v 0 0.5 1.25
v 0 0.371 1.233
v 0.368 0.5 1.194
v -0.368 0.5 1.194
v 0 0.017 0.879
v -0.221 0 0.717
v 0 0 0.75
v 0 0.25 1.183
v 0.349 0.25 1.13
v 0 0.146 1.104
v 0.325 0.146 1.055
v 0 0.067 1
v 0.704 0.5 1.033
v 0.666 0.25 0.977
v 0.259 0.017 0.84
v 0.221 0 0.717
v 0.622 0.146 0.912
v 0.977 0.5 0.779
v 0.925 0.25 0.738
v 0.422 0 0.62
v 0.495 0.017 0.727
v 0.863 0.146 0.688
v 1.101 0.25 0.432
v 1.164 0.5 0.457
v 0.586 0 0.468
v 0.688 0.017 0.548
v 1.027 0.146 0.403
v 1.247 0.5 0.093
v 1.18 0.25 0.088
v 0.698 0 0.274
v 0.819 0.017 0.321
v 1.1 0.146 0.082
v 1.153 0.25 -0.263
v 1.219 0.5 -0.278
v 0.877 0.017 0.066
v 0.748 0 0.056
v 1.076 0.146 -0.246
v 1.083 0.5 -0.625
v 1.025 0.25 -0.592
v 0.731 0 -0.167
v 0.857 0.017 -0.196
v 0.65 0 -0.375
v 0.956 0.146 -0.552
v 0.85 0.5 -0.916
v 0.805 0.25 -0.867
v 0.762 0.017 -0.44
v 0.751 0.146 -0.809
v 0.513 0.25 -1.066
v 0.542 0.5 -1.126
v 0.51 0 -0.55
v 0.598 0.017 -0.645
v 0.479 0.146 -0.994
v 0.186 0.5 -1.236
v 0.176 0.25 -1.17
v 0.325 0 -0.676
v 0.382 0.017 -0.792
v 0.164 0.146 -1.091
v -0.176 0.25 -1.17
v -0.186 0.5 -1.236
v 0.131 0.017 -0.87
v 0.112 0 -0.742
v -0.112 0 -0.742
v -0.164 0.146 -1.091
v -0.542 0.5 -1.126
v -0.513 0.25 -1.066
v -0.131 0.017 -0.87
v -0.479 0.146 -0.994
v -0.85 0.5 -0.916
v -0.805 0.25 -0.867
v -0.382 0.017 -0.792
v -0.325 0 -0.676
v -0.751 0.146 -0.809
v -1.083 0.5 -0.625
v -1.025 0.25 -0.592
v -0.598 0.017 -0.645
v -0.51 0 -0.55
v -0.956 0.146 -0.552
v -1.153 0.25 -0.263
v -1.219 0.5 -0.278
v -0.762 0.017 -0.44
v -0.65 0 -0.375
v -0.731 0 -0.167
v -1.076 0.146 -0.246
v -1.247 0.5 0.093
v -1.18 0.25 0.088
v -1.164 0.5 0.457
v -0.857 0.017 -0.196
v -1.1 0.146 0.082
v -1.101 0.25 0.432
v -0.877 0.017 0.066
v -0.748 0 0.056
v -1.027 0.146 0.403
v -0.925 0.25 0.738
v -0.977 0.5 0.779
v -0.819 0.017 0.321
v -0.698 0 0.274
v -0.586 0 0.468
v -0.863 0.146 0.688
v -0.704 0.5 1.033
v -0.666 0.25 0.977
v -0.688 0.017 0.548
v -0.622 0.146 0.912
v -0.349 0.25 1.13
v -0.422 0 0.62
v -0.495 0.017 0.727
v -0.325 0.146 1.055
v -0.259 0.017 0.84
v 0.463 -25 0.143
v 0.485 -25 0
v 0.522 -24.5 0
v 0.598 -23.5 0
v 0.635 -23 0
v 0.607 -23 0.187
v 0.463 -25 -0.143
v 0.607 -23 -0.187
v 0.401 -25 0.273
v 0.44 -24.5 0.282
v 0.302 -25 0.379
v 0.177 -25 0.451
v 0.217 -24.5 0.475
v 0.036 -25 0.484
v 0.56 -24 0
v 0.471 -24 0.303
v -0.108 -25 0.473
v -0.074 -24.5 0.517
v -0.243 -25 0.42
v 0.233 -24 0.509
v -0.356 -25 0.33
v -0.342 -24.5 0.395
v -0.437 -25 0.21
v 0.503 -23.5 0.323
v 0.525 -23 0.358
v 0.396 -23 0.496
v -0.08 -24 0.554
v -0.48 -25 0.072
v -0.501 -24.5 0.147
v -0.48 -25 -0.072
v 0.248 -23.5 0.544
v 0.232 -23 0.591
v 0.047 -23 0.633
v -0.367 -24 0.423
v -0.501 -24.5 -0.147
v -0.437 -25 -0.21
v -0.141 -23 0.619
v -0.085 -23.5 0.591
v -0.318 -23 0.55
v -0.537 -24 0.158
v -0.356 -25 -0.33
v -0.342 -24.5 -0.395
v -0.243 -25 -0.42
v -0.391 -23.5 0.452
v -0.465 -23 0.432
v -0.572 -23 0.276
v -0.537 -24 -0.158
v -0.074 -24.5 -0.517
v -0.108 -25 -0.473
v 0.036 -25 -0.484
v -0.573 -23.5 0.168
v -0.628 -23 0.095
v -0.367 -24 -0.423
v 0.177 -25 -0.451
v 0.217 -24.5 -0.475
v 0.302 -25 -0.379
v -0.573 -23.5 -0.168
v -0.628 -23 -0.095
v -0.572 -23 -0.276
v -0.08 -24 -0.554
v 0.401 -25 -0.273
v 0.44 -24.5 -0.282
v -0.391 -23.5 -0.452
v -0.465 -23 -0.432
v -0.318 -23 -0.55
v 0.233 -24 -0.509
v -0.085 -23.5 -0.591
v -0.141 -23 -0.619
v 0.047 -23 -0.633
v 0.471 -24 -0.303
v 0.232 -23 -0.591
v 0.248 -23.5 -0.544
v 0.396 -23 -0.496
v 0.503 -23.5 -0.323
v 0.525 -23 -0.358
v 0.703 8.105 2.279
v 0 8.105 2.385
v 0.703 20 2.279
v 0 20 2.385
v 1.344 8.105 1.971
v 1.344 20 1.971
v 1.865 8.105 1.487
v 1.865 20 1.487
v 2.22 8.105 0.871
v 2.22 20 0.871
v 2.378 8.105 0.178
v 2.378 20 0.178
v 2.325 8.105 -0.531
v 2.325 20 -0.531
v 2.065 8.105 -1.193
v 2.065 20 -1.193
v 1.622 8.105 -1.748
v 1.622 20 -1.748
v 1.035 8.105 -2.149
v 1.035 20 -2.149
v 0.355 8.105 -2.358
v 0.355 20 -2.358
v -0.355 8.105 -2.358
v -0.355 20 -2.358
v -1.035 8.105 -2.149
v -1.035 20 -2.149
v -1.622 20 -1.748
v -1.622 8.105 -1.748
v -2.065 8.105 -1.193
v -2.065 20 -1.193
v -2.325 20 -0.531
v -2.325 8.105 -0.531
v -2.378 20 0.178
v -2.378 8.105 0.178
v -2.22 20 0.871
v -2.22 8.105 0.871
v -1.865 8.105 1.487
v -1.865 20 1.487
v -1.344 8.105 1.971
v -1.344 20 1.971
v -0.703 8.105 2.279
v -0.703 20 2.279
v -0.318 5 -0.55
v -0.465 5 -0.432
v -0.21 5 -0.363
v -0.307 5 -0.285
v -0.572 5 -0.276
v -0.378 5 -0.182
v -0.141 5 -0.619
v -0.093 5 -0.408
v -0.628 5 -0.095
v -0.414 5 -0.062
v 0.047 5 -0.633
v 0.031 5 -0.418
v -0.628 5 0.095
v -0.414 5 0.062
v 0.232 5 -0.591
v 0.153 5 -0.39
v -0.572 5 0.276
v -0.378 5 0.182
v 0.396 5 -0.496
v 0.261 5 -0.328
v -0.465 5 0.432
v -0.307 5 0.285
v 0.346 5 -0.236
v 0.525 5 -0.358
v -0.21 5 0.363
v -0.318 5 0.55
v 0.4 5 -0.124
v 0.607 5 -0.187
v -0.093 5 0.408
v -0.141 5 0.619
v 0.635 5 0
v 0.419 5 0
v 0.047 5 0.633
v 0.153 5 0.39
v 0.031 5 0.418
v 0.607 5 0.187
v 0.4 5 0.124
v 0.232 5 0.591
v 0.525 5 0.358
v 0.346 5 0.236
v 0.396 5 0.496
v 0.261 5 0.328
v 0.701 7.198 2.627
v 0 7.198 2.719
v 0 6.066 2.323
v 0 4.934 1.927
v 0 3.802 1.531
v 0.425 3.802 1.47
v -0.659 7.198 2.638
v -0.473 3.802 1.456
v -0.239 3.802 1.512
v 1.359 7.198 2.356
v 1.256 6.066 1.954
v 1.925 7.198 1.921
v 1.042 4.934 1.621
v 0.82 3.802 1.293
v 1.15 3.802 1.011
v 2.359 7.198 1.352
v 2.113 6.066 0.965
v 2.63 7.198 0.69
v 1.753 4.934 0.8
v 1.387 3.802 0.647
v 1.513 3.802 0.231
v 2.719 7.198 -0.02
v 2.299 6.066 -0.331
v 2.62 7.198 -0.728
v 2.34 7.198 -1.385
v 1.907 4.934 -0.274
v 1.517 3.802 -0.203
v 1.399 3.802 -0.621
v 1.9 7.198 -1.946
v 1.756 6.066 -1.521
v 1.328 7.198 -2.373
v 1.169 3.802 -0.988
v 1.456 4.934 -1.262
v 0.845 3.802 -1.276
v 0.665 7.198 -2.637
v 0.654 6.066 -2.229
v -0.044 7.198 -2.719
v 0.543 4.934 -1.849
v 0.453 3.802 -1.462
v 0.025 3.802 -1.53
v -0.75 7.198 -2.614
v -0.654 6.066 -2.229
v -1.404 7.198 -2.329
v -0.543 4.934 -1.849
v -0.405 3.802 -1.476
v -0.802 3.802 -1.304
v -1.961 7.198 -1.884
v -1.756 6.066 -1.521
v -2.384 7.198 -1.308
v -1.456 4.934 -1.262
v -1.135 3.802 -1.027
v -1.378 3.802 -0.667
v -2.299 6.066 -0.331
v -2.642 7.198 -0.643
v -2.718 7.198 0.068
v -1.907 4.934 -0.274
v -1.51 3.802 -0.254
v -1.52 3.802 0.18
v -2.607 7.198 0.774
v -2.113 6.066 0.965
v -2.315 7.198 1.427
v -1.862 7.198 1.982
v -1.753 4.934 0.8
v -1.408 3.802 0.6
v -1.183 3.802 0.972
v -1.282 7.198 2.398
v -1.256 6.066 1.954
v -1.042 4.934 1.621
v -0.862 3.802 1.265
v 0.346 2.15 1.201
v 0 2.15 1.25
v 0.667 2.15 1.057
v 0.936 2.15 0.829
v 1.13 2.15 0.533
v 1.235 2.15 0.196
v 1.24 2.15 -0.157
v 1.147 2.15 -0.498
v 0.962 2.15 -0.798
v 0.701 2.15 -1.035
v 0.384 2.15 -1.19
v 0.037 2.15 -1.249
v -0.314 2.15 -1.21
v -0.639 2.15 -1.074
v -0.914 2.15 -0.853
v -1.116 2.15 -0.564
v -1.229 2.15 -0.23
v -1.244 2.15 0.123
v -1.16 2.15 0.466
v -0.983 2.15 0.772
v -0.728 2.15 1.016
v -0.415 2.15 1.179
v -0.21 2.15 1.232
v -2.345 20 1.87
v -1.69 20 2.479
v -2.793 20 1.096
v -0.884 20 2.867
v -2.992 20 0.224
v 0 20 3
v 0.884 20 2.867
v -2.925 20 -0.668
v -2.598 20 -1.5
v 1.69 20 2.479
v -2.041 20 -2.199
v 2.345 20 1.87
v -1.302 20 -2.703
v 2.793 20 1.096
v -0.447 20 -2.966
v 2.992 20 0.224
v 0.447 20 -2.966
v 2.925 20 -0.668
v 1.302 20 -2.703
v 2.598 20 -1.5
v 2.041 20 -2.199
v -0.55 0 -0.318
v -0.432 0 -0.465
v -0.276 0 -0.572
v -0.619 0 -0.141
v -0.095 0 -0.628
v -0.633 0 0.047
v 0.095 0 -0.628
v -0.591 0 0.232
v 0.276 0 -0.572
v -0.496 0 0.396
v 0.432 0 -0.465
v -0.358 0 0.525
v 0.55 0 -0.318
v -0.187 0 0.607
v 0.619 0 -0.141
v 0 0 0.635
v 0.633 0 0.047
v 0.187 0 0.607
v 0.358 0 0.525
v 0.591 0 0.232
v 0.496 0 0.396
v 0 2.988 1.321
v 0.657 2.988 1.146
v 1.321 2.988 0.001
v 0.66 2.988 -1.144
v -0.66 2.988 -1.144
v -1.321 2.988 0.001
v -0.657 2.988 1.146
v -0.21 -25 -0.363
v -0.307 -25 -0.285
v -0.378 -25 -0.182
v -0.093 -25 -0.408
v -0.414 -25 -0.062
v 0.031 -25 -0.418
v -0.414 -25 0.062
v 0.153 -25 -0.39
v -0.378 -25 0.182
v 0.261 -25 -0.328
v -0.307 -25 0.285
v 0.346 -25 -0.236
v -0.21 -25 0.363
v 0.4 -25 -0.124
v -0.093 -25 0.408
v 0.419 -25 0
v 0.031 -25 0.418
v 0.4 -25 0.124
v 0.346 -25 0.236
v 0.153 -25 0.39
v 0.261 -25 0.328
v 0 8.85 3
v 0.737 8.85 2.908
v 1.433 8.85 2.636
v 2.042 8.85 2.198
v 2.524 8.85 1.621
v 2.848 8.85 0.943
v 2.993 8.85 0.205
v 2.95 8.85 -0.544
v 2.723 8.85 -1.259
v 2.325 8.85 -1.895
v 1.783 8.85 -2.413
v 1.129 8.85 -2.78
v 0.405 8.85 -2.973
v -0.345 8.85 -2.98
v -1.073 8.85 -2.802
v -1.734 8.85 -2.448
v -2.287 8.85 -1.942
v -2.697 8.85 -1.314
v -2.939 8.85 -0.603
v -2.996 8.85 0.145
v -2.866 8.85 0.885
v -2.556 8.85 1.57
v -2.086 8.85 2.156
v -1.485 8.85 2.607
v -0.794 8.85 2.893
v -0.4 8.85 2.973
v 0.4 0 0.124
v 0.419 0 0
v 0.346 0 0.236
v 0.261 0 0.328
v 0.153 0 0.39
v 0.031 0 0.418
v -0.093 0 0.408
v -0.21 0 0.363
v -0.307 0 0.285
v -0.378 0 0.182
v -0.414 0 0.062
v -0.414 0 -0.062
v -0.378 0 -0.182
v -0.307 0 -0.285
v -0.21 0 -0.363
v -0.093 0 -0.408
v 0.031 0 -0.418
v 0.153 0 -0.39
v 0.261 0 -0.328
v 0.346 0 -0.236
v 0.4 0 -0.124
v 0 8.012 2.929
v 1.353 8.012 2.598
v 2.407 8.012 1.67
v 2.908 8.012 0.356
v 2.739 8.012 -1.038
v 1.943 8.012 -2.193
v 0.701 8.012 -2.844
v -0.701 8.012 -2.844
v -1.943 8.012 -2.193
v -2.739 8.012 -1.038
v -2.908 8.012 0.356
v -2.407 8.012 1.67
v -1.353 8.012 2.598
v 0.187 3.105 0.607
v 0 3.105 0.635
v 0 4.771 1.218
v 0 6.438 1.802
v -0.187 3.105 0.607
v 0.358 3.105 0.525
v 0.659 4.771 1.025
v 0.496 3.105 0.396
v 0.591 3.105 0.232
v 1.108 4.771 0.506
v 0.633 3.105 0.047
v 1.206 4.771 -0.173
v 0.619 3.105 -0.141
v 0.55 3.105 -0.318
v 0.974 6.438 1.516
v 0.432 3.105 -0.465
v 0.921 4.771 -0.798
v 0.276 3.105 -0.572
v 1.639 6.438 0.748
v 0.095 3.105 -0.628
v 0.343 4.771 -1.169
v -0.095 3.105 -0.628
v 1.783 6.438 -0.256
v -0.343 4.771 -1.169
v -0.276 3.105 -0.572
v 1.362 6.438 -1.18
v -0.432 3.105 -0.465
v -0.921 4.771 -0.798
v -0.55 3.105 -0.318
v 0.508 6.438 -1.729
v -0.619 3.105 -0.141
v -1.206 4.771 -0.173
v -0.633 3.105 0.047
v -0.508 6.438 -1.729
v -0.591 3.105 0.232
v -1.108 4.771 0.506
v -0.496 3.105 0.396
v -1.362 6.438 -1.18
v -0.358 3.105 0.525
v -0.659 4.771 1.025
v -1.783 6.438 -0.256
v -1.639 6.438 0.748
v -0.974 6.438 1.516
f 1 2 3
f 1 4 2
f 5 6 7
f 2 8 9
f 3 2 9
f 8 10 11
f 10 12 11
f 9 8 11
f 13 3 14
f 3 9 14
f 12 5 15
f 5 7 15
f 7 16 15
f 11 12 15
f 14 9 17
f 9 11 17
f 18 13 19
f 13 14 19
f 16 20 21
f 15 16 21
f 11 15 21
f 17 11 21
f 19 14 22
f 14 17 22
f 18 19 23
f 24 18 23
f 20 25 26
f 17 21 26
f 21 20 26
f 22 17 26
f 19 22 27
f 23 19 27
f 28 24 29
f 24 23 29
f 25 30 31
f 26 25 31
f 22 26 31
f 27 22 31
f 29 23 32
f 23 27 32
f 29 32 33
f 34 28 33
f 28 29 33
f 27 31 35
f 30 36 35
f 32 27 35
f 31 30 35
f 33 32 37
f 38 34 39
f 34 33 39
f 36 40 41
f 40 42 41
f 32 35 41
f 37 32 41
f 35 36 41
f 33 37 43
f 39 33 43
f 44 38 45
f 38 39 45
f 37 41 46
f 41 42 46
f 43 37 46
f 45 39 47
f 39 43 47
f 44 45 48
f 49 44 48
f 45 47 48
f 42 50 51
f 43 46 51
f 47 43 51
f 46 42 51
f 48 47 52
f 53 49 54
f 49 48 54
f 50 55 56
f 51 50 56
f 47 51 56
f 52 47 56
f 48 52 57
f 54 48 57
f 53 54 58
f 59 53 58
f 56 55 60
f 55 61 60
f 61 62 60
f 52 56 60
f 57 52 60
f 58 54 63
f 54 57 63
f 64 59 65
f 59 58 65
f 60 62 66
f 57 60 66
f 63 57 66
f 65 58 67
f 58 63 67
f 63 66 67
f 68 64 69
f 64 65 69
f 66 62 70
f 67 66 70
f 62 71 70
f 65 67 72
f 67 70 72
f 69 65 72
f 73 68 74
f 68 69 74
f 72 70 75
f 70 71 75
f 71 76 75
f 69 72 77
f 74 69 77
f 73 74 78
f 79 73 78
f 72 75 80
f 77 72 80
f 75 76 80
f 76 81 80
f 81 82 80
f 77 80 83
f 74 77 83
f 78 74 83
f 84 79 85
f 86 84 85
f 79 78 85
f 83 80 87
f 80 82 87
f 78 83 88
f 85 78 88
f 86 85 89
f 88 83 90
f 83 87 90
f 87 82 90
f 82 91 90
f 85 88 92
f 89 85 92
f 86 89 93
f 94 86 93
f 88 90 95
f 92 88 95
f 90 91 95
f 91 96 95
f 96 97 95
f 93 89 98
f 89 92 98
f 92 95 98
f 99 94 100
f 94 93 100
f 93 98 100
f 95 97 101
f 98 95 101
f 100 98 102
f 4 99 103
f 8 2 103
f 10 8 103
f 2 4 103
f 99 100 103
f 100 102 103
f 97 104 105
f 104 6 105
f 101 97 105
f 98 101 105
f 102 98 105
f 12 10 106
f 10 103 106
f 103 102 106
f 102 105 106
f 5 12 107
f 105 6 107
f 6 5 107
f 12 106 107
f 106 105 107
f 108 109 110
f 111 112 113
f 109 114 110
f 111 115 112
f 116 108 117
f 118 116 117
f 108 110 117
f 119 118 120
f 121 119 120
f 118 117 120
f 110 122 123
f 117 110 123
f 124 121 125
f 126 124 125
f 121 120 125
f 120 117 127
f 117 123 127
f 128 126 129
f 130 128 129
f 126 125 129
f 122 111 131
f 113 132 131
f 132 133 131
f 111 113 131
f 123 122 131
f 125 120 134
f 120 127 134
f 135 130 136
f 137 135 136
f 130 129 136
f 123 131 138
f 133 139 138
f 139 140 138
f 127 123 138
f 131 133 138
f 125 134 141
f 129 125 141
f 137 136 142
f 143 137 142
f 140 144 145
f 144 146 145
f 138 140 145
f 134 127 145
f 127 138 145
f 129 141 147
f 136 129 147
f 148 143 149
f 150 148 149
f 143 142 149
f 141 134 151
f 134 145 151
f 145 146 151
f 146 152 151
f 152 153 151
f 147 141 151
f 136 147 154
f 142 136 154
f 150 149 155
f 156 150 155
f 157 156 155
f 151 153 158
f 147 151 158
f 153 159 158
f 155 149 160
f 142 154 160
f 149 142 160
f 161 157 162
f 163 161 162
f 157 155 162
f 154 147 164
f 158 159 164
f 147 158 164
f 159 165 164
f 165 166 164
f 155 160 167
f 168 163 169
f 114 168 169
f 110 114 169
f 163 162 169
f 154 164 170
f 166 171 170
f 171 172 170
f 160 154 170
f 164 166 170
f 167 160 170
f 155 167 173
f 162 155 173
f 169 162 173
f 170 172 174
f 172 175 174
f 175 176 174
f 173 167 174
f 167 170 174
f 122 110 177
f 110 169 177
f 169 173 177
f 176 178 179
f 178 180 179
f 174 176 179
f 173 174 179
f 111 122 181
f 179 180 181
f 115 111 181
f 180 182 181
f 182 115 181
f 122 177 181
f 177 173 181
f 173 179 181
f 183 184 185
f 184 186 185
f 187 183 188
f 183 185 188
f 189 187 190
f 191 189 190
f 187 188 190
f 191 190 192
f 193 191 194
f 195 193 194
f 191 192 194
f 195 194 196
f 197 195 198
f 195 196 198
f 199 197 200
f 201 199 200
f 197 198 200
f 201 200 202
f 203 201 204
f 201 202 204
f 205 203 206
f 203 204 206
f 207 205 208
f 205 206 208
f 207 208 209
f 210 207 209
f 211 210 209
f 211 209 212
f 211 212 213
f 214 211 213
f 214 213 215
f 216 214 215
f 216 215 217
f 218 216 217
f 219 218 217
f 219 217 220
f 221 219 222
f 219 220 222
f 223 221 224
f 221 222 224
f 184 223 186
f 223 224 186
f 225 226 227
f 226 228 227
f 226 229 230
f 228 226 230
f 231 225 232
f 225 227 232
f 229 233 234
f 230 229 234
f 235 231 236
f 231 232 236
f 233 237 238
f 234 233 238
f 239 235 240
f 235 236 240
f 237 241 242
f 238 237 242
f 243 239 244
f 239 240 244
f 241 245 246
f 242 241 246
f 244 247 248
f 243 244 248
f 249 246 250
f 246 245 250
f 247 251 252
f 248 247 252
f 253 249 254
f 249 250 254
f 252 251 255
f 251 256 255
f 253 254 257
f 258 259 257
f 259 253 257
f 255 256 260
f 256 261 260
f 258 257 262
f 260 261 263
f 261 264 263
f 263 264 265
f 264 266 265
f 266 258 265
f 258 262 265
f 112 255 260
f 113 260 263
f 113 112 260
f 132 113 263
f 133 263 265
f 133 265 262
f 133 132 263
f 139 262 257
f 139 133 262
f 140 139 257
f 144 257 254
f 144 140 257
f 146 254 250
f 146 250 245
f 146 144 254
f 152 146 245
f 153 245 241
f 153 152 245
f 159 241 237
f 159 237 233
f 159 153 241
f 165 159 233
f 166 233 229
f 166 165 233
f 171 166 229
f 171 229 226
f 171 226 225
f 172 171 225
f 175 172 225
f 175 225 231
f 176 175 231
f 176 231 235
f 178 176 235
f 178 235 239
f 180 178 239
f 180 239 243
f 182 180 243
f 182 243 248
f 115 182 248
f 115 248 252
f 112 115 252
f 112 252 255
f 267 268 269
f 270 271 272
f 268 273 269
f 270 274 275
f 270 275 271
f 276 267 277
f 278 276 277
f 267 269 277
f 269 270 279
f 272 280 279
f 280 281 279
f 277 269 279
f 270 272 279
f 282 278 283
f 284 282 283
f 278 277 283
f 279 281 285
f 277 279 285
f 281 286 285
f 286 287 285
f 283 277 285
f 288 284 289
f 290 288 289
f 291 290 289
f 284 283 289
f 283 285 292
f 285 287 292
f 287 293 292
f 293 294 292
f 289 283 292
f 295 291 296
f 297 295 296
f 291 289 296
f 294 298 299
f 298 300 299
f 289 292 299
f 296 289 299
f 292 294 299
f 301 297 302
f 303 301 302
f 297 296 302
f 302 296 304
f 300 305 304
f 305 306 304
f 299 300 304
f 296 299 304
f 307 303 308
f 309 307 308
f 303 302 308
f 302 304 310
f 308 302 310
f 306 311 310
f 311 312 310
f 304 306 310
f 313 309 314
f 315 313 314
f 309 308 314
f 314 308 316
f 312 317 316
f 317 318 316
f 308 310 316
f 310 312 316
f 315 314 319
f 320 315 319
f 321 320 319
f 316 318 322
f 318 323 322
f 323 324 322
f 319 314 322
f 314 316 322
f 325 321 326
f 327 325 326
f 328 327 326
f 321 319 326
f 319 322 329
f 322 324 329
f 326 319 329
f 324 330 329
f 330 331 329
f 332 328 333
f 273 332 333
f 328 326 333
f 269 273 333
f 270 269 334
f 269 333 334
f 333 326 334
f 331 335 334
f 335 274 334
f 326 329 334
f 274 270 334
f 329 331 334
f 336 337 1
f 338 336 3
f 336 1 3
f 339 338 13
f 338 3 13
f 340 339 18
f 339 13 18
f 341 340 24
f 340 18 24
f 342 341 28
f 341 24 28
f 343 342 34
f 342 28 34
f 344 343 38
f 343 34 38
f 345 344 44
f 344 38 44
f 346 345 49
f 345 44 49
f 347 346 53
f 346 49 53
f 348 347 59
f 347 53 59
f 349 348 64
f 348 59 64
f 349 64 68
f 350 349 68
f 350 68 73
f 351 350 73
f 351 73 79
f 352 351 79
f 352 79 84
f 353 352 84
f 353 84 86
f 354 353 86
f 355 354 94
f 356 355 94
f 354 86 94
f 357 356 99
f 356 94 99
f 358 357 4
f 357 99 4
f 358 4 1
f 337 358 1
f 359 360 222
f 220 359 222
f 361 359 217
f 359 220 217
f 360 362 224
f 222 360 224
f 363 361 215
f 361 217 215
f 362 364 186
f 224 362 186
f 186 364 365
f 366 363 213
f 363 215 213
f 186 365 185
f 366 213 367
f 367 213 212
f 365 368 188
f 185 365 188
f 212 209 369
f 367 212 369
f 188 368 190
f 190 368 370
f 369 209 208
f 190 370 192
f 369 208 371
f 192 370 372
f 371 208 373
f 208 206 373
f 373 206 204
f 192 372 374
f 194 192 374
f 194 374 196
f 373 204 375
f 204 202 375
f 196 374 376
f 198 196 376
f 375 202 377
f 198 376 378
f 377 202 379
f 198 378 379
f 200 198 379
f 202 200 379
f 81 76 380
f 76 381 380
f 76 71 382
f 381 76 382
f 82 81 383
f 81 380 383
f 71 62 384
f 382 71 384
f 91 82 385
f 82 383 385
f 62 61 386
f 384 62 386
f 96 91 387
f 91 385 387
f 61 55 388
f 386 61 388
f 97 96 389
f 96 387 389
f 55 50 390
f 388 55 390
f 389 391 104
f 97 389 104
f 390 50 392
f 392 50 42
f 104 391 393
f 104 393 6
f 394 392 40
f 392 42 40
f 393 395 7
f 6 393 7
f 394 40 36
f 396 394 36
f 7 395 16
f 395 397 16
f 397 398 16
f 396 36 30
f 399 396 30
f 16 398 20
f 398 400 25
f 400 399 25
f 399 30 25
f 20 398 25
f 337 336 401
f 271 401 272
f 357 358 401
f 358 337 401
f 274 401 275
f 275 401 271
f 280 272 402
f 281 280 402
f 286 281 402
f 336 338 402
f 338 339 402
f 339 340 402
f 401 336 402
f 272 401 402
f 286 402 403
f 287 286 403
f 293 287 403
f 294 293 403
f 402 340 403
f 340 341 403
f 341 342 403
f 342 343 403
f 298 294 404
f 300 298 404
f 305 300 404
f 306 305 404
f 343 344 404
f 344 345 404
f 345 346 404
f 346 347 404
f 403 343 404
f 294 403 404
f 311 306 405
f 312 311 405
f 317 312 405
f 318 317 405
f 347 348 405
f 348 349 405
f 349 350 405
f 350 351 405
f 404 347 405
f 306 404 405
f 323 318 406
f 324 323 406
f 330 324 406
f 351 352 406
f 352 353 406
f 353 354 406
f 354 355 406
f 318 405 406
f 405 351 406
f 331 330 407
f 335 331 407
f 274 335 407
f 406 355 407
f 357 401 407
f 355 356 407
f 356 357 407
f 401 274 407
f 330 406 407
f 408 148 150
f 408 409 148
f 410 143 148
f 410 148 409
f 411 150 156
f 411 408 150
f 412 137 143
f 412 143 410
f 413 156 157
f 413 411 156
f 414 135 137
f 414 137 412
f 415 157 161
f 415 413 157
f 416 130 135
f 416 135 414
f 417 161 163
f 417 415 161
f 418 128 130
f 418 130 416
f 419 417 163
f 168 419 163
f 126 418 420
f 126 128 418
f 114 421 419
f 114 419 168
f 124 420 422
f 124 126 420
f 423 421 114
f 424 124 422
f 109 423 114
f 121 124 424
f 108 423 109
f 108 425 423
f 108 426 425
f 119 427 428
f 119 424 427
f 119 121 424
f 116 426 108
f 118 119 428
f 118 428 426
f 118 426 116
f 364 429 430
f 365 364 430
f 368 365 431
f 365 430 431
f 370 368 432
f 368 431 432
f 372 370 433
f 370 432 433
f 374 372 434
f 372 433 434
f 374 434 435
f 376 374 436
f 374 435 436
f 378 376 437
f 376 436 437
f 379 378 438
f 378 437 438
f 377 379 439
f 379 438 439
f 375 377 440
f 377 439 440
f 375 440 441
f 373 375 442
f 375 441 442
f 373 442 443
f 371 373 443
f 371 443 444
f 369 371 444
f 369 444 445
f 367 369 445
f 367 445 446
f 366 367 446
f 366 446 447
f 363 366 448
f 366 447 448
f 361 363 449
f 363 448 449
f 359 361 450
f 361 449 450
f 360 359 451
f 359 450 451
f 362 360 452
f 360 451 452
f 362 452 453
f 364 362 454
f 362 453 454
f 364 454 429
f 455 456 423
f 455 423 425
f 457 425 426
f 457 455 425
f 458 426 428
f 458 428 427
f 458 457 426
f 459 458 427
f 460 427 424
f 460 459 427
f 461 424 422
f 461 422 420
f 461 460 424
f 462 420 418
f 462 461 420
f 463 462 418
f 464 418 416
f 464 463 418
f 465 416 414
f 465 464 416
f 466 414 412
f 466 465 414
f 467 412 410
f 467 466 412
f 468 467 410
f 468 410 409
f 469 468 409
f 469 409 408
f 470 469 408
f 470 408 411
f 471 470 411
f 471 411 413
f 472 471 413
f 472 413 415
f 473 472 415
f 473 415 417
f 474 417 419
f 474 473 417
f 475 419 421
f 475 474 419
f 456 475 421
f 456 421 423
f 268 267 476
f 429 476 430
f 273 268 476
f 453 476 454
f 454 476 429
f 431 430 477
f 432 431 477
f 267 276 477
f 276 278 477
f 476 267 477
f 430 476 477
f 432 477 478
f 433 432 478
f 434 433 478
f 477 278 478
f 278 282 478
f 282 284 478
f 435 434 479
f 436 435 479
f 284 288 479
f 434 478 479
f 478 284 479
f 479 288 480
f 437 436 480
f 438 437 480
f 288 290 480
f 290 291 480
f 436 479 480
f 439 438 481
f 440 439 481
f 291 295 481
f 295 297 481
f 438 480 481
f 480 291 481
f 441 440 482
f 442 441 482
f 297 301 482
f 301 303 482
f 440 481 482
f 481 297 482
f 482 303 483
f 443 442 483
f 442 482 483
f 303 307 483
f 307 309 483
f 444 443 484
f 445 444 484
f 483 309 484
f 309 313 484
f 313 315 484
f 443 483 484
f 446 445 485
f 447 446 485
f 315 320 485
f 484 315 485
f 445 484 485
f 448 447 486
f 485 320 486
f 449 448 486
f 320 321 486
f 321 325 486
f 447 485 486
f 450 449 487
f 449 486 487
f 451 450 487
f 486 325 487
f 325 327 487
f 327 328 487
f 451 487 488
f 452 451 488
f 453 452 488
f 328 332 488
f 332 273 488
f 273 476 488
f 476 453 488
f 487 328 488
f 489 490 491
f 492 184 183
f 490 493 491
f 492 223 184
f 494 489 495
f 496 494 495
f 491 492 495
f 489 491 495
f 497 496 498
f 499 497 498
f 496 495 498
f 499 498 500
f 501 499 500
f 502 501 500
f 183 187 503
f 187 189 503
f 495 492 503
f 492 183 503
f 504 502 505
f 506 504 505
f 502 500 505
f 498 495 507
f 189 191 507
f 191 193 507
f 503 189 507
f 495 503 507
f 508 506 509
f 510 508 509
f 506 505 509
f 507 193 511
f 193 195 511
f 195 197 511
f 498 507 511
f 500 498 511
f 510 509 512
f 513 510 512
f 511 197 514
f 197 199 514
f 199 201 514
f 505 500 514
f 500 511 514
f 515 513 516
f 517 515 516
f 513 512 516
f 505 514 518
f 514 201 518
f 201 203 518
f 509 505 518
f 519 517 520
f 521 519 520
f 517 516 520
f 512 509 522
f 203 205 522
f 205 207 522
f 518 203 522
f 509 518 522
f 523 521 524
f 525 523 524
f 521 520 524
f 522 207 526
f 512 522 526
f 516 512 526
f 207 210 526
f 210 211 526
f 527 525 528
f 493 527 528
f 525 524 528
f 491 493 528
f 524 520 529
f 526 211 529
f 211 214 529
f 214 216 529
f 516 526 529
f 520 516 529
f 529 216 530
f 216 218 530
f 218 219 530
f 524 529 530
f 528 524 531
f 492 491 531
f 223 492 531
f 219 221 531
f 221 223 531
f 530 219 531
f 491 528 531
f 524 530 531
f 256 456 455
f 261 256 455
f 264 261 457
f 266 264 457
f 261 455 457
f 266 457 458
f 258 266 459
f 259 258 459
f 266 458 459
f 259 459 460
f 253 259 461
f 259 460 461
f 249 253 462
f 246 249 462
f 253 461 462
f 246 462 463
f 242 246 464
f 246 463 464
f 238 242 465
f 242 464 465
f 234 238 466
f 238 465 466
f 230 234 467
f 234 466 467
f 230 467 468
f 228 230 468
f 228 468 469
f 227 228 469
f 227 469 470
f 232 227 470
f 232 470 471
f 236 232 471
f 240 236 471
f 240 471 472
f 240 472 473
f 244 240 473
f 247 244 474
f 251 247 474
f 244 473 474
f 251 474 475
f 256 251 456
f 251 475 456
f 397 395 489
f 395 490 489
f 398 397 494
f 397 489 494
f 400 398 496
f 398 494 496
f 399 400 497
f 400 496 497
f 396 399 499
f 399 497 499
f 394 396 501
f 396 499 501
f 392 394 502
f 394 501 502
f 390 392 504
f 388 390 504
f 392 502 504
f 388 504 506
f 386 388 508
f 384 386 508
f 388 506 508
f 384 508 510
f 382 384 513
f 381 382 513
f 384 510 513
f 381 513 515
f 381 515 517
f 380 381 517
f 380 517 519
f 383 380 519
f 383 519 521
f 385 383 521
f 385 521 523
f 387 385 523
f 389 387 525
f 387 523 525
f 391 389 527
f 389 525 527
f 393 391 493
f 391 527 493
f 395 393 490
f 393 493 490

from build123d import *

# Parameters (mm, degrees)
F0_R          = 0.635
F0_R_2        = 0.419
F1_DEPTH      = 25
F1_DEPTH_BACK = 5
F4_R          = 0.5
F5_R          = 5
F6_SIZE2      = 2
F6_SIZE       = 0.15


with BuildPart() as f1:
    # F0 (on Front) → F1 (new body, two sides)
    with BuildSketch(Plane.XZ) as f1_sk:
        Circle(F0_R)
        Circle(F0_R_2, mode=Mode.SUBTRACT)
    extrude(amount=F1_DEPTH)
    extrude(f1_sk.sketch, amount=-F1_DEPTH_BACK)

    # F6
    f6_edges = [f1.edges().sort_by_distance(p)[0] for p in [
        (-0.635, -25, 0),
    ]]
    f6_side = f1.faces().sort_by_distance((-0.617039, -25, 0))[0]
    chamfer(f6_edges, length=F6_SIZE, length2=F6_SIZE2, reference=f6_side)


with BuildPart() as f3:
    # F2 (on Right) → F3 (revolve)
    with BuildSketch(Plane.YZ):
        Polygon((3, 1.25), (0, 1.25), (0, 0.635), (3.1045166231, 0.635), (8.1045166231, 2.385), (20, 2.385), (20, 3), (8, 3), align=None)
    revolve(axis=Axis((0, 7.991485962, 0), (0, 1, 0)))

    # F4
    f4_edges = [f3.edges().sort_by_distance(p)[0] for p in [
        (0, 0, -1.25),
    ]]
    fillet(f4_edges, radius=F4_R)

    # F5
    f5_edges = [f3.edges().sort_by_distance(p)[0] for p in [
        (0, 8, -3),
        (0, 3, -1.25),
    ]]
    fillet(f5_edges, radius=F5_R)


solid = Compound([f1.part, f3.part])
